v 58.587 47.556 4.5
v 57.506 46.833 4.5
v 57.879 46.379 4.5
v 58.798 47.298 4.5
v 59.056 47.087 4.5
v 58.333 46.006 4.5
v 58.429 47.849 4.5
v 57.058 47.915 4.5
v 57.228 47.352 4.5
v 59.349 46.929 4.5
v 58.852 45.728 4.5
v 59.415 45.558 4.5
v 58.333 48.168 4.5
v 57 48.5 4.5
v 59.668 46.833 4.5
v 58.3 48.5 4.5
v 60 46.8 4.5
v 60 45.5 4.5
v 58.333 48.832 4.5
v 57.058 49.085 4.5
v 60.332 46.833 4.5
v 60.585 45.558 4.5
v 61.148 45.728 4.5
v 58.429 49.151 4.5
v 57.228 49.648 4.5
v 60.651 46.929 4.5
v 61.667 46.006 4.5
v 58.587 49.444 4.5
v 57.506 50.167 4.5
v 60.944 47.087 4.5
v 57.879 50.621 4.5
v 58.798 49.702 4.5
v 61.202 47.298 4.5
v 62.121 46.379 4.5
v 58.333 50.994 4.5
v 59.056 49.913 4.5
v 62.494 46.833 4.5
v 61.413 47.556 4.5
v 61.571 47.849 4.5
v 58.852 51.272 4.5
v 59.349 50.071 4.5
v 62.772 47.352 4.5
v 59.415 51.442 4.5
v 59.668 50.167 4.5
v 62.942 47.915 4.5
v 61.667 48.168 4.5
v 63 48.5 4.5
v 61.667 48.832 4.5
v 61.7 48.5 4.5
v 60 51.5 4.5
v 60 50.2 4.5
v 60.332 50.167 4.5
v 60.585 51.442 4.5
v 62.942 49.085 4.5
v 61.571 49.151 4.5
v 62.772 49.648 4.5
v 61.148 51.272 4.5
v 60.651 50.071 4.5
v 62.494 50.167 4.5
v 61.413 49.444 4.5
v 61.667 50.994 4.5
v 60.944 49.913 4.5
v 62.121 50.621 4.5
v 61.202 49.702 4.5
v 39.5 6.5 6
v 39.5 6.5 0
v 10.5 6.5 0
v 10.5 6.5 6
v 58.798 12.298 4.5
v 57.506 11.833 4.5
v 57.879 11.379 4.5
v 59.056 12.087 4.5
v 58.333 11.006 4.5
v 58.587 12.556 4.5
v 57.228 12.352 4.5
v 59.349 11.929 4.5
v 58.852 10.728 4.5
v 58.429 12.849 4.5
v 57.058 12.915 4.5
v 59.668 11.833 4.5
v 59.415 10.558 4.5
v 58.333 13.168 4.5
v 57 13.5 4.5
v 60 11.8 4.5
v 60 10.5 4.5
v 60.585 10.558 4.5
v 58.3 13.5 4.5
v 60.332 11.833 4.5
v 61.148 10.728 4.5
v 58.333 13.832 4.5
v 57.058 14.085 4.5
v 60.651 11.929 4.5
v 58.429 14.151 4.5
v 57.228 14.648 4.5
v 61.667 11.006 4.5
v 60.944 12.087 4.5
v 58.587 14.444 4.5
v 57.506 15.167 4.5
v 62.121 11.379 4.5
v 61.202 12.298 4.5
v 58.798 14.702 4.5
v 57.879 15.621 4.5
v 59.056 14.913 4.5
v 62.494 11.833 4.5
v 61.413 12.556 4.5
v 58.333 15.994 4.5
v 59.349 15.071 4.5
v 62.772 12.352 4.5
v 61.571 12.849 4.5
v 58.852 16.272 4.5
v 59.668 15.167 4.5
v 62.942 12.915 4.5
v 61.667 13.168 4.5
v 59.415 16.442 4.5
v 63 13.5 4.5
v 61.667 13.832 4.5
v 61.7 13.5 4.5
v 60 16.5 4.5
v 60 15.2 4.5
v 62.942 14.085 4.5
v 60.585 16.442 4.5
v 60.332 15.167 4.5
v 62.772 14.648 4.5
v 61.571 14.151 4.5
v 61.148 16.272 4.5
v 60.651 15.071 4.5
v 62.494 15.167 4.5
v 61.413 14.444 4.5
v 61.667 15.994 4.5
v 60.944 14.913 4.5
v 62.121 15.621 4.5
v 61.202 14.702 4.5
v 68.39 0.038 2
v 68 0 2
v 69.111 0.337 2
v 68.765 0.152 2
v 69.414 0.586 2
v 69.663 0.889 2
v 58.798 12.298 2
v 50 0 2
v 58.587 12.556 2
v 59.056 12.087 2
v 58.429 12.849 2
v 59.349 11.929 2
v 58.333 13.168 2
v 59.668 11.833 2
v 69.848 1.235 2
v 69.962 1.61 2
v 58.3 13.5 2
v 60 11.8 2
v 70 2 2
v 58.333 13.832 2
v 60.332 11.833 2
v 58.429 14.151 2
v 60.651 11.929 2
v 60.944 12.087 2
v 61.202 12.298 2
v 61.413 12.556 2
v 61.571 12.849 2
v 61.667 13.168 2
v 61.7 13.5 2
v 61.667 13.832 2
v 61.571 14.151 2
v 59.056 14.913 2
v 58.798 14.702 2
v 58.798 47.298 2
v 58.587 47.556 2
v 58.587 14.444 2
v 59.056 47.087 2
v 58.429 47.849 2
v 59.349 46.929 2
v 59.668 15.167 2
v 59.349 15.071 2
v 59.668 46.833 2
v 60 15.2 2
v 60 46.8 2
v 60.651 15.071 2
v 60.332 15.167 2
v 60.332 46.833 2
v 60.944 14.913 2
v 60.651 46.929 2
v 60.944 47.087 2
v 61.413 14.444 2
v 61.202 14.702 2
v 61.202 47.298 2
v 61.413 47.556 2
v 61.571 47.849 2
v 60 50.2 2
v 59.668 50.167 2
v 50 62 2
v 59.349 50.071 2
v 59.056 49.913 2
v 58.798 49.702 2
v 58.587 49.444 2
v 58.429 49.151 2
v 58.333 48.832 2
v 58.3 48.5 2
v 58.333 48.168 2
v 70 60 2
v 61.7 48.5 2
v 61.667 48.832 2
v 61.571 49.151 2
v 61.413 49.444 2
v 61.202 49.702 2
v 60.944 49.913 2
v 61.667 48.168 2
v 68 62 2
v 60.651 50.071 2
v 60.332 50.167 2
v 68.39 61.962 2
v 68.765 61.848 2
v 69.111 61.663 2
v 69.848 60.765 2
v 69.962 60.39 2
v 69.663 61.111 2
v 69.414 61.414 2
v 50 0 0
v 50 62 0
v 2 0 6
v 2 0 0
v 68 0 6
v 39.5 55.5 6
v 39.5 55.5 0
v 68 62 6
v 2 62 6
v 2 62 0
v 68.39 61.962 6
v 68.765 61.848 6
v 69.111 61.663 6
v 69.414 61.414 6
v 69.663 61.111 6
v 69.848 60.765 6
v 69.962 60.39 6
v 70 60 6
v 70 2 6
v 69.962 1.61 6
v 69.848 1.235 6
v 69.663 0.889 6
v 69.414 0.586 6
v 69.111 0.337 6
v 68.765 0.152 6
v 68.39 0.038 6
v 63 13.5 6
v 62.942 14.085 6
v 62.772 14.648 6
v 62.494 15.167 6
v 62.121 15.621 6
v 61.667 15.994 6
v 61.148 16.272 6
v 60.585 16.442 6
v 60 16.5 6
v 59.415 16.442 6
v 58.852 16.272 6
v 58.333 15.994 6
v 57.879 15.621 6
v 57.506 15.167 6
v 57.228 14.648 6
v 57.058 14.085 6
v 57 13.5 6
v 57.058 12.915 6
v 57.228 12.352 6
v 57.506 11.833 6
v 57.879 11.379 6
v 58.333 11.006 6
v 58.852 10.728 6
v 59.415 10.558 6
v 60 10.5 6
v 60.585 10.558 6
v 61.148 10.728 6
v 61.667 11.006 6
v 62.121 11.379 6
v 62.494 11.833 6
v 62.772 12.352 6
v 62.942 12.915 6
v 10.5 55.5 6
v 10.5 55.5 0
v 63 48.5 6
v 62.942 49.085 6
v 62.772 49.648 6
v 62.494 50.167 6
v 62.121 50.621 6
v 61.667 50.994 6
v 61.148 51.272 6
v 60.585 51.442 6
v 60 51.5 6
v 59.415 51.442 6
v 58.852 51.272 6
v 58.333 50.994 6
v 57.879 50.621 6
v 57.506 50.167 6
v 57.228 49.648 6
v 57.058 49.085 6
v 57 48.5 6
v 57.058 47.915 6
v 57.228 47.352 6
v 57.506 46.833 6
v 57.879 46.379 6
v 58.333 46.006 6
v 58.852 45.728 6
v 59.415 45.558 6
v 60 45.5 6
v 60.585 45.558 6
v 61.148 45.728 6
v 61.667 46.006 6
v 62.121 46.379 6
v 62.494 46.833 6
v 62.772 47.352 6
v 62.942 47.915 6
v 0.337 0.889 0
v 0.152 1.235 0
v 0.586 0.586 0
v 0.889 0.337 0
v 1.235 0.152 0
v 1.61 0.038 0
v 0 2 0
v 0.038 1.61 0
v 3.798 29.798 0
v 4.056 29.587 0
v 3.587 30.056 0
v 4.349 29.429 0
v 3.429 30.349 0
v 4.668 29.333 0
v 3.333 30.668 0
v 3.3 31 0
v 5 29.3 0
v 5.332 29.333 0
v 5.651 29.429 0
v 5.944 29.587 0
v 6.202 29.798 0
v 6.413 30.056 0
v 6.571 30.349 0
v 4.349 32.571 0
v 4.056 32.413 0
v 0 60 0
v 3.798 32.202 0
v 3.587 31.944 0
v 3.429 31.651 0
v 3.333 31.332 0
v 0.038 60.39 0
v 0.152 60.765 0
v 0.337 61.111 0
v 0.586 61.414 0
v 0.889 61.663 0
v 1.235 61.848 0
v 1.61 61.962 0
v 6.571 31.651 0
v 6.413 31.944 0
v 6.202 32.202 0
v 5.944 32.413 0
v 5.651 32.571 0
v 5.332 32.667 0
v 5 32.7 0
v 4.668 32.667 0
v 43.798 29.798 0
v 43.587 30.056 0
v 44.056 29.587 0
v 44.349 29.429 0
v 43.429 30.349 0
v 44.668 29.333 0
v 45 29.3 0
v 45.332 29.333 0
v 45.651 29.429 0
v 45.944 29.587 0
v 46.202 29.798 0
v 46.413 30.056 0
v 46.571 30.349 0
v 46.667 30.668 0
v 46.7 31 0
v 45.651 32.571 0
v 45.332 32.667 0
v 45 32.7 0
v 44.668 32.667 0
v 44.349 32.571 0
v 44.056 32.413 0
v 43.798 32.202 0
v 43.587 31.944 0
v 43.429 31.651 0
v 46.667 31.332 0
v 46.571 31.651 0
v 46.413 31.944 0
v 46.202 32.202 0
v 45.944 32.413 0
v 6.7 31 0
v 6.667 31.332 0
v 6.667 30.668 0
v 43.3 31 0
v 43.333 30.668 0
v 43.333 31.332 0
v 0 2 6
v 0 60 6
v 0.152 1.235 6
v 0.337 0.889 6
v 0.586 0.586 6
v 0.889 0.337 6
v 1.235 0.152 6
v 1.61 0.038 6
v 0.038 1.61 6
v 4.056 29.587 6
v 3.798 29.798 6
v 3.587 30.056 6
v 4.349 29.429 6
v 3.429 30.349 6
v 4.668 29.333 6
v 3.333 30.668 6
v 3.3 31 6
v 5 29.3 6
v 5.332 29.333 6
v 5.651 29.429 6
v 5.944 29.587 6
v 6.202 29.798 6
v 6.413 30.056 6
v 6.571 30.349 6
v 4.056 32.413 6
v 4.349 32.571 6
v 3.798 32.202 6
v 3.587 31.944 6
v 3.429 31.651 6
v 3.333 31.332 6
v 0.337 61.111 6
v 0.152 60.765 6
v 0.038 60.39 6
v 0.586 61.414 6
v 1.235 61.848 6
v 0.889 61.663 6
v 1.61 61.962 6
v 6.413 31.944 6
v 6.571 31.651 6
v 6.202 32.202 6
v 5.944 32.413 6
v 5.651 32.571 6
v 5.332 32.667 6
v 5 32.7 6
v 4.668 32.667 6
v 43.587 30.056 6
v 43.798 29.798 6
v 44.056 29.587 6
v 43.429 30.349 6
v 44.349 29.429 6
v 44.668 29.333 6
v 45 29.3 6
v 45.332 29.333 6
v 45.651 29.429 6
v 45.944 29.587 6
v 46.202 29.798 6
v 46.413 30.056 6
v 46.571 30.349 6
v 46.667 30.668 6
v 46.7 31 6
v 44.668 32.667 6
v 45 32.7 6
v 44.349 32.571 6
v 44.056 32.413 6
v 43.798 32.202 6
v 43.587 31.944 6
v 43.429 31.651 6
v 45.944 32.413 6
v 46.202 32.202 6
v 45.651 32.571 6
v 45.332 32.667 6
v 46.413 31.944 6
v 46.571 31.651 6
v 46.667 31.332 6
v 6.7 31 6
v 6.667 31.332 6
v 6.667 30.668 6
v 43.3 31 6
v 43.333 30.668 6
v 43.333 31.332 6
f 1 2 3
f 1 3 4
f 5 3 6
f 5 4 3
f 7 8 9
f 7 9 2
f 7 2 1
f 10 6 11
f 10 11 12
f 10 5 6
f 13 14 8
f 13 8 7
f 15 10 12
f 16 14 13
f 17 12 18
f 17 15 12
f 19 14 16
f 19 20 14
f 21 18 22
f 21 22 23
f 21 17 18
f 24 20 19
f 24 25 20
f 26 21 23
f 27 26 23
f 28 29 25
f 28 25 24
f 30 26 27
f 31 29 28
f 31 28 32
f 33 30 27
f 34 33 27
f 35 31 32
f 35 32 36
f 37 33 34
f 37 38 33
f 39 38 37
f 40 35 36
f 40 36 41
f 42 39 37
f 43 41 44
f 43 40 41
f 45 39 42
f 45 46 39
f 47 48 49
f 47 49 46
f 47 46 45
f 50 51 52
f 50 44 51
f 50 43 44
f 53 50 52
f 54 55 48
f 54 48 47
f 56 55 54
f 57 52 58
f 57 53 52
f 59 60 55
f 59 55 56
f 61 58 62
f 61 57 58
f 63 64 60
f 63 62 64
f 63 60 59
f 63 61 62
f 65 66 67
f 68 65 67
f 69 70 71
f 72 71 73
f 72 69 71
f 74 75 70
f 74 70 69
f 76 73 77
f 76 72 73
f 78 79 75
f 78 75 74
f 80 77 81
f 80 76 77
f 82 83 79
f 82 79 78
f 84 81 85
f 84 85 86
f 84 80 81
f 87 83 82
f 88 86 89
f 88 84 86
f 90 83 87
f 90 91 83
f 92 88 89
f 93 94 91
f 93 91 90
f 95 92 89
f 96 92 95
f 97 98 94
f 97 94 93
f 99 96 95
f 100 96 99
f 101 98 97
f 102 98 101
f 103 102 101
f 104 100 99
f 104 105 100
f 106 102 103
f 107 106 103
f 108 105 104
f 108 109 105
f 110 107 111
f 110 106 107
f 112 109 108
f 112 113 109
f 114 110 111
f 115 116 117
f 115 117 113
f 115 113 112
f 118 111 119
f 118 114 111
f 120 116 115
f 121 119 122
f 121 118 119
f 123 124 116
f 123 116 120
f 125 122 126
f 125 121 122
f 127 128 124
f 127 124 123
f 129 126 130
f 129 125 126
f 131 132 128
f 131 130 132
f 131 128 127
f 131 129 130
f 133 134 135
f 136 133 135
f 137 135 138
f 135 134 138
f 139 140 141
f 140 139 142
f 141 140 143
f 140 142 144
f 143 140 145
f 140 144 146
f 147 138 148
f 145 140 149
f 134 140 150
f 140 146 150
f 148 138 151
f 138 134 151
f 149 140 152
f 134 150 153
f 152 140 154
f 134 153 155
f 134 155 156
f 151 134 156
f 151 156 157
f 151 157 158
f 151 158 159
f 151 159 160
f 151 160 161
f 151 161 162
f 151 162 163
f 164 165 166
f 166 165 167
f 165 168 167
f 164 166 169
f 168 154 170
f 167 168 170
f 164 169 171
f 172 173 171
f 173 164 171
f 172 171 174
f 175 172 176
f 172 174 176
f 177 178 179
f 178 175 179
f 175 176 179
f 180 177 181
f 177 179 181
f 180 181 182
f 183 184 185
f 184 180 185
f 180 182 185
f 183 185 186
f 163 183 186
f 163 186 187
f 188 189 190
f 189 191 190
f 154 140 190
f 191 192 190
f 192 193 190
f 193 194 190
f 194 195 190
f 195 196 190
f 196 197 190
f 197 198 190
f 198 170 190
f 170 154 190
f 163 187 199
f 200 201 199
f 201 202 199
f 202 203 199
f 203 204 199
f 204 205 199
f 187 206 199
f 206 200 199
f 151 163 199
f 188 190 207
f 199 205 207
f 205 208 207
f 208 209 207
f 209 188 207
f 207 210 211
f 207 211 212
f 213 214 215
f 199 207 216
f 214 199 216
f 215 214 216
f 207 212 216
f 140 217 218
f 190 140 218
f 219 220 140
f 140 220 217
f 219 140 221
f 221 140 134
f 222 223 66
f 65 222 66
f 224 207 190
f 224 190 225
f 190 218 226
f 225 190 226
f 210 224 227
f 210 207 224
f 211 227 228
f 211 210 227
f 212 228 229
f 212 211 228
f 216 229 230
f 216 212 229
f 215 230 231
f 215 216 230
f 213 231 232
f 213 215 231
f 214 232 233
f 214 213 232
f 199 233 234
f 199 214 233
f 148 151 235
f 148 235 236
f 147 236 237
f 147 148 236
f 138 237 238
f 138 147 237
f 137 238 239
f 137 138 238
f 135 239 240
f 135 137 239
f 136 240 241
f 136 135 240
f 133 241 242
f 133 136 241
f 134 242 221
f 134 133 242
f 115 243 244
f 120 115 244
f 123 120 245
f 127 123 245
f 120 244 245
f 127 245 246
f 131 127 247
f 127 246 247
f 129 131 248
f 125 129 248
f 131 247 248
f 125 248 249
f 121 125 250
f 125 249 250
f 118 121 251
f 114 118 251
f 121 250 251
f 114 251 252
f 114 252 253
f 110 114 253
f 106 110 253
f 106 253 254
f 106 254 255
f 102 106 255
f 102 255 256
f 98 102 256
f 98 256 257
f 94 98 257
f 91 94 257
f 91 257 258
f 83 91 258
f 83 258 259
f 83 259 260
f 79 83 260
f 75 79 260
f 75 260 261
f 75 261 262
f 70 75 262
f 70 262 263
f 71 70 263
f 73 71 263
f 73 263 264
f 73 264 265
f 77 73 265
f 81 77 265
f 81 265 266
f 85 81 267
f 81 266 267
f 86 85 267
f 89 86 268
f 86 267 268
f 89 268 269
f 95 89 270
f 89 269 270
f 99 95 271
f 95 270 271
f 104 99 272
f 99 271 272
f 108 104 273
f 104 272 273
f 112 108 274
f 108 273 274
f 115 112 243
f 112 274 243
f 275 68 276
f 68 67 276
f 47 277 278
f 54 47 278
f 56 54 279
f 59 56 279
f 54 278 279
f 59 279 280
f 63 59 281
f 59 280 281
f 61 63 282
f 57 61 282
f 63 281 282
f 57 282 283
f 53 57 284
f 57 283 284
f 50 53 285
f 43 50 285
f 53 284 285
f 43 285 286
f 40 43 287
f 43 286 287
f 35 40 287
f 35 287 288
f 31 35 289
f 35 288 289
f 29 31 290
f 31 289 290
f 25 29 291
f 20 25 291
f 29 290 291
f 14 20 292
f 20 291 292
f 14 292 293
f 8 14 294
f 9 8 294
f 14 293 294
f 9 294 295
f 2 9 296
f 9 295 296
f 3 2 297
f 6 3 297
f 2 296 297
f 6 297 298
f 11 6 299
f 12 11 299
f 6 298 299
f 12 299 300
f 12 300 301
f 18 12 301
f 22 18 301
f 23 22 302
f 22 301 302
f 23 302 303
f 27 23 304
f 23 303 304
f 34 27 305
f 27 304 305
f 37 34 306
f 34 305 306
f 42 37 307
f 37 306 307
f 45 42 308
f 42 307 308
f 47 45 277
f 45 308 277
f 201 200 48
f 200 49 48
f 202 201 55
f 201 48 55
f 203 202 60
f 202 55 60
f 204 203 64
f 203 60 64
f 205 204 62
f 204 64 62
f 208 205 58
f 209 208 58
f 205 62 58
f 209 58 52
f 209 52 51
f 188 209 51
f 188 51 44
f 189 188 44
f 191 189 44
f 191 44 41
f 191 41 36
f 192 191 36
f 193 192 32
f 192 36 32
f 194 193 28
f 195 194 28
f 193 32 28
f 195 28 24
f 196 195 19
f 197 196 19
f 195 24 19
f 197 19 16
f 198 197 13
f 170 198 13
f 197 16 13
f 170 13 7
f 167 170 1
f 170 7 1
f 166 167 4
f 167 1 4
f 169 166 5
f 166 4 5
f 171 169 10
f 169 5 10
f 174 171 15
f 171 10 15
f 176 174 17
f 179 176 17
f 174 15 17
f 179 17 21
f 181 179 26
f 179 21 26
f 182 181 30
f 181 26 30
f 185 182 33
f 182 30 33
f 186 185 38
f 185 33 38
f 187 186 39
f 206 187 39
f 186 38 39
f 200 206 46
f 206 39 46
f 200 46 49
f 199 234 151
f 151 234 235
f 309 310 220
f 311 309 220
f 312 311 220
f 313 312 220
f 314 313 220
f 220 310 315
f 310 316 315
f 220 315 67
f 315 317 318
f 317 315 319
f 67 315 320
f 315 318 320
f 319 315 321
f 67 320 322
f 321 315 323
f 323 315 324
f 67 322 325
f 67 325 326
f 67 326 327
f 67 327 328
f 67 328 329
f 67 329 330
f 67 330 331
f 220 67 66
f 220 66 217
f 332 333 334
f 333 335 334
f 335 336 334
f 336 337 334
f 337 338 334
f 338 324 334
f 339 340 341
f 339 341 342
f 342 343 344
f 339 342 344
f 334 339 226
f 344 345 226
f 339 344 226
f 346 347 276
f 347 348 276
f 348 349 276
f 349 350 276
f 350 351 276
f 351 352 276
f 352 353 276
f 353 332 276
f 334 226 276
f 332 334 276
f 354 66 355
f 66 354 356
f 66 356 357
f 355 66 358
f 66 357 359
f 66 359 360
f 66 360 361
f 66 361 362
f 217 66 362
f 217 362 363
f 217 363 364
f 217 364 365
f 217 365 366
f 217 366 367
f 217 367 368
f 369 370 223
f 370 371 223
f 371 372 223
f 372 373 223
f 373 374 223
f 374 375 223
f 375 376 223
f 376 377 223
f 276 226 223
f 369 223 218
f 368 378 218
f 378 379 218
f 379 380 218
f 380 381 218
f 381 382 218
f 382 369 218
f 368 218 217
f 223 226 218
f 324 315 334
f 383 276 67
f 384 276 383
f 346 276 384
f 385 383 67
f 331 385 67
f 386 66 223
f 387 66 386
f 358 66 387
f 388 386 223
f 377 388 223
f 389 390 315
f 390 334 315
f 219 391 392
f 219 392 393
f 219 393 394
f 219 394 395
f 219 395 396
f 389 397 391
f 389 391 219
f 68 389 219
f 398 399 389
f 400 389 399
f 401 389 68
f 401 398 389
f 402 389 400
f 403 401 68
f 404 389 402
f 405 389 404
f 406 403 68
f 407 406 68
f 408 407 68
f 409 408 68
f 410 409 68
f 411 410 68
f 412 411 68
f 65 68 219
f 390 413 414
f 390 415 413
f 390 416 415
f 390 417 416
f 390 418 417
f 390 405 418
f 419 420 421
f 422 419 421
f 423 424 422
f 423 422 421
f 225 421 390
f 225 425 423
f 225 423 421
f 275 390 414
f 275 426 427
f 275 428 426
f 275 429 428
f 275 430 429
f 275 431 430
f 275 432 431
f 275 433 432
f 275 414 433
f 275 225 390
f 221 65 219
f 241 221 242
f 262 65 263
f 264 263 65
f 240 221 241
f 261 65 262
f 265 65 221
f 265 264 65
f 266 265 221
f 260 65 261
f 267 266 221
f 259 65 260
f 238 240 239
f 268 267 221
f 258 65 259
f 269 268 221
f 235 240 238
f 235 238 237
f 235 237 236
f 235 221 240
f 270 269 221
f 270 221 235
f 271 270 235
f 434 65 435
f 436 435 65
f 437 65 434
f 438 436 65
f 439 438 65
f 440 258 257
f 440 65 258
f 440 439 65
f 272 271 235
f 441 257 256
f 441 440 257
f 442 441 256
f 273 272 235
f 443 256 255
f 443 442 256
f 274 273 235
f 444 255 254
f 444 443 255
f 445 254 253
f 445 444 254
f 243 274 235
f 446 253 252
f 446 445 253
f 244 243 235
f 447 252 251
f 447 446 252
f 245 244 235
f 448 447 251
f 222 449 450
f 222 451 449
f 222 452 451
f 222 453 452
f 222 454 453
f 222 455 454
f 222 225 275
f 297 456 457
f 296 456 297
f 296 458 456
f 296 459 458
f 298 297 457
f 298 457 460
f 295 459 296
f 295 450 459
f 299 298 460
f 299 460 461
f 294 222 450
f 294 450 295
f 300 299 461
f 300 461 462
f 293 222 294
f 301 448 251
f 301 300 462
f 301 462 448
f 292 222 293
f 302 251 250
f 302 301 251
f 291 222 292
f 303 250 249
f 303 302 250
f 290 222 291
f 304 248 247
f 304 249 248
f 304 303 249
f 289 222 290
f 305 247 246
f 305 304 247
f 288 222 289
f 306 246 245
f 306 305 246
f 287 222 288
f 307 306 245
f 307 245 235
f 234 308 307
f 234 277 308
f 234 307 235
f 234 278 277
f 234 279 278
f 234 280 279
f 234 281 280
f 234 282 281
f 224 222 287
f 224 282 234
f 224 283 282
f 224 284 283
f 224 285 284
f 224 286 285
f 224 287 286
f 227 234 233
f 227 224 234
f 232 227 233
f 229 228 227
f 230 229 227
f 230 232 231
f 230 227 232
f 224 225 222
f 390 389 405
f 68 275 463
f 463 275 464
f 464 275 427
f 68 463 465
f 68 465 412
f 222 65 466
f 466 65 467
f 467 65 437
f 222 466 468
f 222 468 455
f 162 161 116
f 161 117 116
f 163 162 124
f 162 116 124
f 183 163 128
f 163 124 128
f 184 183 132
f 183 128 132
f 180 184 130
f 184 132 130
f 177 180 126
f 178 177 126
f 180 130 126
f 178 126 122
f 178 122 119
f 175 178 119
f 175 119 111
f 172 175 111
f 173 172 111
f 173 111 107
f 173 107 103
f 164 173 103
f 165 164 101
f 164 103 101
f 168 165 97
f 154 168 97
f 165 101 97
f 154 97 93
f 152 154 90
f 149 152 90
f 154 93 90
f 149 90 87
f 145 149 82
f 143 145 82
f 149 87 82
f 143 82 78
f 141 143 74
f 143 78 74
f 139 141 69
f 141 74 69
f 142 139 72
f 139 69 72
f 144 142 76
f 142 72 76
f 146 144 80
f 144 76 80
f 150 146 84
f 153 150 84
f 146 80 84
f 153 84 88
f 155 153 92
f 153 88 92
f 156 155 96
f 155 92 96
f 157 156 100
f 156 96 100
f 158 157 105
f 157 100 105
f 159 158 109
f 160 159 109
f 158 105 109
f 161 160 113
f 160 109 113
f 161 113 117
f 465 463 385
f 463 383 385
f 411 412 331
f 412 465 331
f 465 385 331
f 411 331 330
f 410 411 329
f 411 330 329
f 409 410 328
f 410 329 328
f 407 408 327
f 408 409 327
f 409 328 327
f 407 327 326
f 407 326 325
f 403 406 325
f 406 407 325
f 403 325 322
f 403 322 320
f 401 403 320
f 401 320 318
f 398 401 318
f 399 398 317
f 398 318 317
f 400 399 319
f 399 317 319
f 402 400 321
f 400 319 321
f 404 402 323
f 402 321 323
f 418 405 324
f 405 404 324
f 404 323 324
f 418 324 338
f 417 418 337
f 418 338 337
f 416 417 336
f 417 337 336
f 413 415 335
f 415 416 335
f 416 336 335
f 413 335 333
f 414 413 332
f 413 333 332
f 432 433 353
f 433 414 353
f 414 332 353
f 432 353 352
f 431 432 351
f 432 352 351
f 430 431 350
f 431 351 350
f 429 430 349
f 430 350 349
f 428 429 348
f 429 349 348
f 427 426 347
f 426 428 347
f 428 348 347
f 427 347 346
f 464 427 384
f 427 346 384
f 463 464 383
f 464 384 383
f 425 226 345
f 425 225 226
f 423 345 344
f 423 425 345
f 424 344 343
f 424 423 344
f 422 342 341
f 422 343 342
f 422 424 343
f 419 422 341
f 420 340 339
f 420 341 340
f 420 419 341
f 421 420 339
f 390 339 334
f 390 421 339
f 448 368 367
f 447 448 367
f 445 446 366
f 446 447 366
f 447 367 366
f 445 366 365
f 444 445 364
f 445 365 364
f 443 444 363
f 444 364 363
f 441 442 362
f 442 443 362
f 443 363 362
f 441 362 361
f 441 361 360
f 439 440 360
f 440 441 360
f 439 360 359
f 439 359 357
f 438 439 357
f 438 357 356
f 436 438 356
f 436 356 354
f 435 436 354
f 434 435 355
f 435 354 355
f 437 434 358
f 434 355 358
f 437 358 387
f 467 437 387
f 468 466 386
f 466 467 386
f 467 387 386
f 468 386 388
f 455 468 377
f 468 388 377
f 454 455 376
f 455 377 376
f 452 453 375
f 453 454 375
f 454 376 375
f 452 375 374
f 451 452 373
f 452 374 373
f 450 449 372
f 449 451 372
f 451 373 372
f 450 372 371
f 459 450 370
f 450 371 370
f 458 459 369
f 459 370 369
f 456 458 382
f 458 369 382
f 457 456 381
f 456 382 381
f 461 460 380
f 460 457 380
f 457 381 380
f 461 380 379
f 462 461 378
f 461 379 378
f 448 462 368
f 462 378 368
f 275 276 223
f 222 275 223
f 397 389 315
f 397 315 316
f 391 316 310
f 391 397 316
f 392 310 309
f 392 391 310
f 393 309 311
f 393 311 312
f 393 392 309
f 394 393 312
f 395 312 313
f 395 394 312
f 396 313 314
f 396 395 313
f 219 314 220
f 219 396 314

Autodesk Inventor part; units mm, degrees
ref_plane "YZ Plane" through (0, 0, 0) normal (1, 0, 0) x (0, 1, 0)
ref_plane "XZ Plane" through (0, 0, 0) normal (0, 1, 0) x (-1, 0, 0)
ref_plane "XY Plane" through (0, 0, 0) normal (0, 0, 1) x (1, 0, 0)
sketch "Sketch1" plane through (0, 0, 0) normal (0, 0, 1) x (1, 0, 0)
  line L0 (0, 0) -> (50, 0)
  line L1 (50, 0) -> (50, 62)
  line L2 (50, 62) -> (0, 62)
  line L3 (0, 62) -> (0, 0)
  circle A0 centre (5, 31) radius 1.7
  circle A1 centre (45, 31) radius 1.7
  line L4 (10.5, 55.5) -> (39.5, 55.5)
  line L5 (39.5, 55.5) -> (39.5, 6.5)
  line L6 (39.5, 6.5) -> (10.5, 6.5)
  line L7 (10.5, 6.5) -> (10.5, 55.5)
  line L8 (25, 55.5) -> (25, 6.5) construction
  point P0 (10.5, 31)
  point P1 (39.5, 31)
  point P2 (50, 31)
  dimension "d0" = 3.4
  dimension "d1" = 3.4
  dimension "d2" = 40
  dimension "d3" = 29
  dimension "d4" = 49
  dimension "d5" = 5
  dimension "d6" = 5
  dimension "d7" = 62
extrude "Extrusion1" add sketch "Sketch1" along normal blind 6
sketch "Sketch3" plane through (0, 0, 6) normal (0, 0, 1) x (1, 0, 0)
  line L0 (50, 62) -> (0, 62) projected
  line L1 (50, 62) -> (70, 62)
  line L2 (70, 62) -> (70, 0)
  line L3 (70, 0) -> (50, 0)
  line L4 (50, 0) -> (50, 62)
  circle A0 centre (60, 48.5) radius 1.7
  circle A1 centre (60, 13.5) radius 1.7
  line L5 (60, 48.5) -> (60, 13.5) construction
  point P0 (0, 0)
  point P1 (60, 0)
  point P2 (60, 31)
  point P3 (70, 31)
  dimension "d14" = 20
  dimension "d15" = 3.4
  dimension "d16" = 3.4
  dimension "d17" = 35
extrude "Extrusion3" add sketch "Sketch3" against normal blind 4
sketch "Sketch4" plane through (0, 0, 6) normal (0, 0, 1) x (1, 0, 0)
  circle A0 centre (60, 48.5) radius 1.7 projected
  circle A1 centre (60, 13.5) radius 1.7 projected
  circle A2 centre (60, 48.5) radius 1.7 projected
  circle A3 centre (60, 48.5) radius 3
  circle A4 centre (60, 13.5) radius 1.7 projected
  circle A5 centre (60, 13.5) radius 3
  point P0 (0, 0)
  dimension "d20" = 6
  dimension "d21" = 6
extrude "Extrusion4" cut sketch "Sketch4" against normal blind 1.5
fillet "Fillet1" radius 2 4 edges at (0, 62, 3) (0, 0, 3) (70, 0, 4) (70, 62, 4)
properties part number "power_switch_bracket"
